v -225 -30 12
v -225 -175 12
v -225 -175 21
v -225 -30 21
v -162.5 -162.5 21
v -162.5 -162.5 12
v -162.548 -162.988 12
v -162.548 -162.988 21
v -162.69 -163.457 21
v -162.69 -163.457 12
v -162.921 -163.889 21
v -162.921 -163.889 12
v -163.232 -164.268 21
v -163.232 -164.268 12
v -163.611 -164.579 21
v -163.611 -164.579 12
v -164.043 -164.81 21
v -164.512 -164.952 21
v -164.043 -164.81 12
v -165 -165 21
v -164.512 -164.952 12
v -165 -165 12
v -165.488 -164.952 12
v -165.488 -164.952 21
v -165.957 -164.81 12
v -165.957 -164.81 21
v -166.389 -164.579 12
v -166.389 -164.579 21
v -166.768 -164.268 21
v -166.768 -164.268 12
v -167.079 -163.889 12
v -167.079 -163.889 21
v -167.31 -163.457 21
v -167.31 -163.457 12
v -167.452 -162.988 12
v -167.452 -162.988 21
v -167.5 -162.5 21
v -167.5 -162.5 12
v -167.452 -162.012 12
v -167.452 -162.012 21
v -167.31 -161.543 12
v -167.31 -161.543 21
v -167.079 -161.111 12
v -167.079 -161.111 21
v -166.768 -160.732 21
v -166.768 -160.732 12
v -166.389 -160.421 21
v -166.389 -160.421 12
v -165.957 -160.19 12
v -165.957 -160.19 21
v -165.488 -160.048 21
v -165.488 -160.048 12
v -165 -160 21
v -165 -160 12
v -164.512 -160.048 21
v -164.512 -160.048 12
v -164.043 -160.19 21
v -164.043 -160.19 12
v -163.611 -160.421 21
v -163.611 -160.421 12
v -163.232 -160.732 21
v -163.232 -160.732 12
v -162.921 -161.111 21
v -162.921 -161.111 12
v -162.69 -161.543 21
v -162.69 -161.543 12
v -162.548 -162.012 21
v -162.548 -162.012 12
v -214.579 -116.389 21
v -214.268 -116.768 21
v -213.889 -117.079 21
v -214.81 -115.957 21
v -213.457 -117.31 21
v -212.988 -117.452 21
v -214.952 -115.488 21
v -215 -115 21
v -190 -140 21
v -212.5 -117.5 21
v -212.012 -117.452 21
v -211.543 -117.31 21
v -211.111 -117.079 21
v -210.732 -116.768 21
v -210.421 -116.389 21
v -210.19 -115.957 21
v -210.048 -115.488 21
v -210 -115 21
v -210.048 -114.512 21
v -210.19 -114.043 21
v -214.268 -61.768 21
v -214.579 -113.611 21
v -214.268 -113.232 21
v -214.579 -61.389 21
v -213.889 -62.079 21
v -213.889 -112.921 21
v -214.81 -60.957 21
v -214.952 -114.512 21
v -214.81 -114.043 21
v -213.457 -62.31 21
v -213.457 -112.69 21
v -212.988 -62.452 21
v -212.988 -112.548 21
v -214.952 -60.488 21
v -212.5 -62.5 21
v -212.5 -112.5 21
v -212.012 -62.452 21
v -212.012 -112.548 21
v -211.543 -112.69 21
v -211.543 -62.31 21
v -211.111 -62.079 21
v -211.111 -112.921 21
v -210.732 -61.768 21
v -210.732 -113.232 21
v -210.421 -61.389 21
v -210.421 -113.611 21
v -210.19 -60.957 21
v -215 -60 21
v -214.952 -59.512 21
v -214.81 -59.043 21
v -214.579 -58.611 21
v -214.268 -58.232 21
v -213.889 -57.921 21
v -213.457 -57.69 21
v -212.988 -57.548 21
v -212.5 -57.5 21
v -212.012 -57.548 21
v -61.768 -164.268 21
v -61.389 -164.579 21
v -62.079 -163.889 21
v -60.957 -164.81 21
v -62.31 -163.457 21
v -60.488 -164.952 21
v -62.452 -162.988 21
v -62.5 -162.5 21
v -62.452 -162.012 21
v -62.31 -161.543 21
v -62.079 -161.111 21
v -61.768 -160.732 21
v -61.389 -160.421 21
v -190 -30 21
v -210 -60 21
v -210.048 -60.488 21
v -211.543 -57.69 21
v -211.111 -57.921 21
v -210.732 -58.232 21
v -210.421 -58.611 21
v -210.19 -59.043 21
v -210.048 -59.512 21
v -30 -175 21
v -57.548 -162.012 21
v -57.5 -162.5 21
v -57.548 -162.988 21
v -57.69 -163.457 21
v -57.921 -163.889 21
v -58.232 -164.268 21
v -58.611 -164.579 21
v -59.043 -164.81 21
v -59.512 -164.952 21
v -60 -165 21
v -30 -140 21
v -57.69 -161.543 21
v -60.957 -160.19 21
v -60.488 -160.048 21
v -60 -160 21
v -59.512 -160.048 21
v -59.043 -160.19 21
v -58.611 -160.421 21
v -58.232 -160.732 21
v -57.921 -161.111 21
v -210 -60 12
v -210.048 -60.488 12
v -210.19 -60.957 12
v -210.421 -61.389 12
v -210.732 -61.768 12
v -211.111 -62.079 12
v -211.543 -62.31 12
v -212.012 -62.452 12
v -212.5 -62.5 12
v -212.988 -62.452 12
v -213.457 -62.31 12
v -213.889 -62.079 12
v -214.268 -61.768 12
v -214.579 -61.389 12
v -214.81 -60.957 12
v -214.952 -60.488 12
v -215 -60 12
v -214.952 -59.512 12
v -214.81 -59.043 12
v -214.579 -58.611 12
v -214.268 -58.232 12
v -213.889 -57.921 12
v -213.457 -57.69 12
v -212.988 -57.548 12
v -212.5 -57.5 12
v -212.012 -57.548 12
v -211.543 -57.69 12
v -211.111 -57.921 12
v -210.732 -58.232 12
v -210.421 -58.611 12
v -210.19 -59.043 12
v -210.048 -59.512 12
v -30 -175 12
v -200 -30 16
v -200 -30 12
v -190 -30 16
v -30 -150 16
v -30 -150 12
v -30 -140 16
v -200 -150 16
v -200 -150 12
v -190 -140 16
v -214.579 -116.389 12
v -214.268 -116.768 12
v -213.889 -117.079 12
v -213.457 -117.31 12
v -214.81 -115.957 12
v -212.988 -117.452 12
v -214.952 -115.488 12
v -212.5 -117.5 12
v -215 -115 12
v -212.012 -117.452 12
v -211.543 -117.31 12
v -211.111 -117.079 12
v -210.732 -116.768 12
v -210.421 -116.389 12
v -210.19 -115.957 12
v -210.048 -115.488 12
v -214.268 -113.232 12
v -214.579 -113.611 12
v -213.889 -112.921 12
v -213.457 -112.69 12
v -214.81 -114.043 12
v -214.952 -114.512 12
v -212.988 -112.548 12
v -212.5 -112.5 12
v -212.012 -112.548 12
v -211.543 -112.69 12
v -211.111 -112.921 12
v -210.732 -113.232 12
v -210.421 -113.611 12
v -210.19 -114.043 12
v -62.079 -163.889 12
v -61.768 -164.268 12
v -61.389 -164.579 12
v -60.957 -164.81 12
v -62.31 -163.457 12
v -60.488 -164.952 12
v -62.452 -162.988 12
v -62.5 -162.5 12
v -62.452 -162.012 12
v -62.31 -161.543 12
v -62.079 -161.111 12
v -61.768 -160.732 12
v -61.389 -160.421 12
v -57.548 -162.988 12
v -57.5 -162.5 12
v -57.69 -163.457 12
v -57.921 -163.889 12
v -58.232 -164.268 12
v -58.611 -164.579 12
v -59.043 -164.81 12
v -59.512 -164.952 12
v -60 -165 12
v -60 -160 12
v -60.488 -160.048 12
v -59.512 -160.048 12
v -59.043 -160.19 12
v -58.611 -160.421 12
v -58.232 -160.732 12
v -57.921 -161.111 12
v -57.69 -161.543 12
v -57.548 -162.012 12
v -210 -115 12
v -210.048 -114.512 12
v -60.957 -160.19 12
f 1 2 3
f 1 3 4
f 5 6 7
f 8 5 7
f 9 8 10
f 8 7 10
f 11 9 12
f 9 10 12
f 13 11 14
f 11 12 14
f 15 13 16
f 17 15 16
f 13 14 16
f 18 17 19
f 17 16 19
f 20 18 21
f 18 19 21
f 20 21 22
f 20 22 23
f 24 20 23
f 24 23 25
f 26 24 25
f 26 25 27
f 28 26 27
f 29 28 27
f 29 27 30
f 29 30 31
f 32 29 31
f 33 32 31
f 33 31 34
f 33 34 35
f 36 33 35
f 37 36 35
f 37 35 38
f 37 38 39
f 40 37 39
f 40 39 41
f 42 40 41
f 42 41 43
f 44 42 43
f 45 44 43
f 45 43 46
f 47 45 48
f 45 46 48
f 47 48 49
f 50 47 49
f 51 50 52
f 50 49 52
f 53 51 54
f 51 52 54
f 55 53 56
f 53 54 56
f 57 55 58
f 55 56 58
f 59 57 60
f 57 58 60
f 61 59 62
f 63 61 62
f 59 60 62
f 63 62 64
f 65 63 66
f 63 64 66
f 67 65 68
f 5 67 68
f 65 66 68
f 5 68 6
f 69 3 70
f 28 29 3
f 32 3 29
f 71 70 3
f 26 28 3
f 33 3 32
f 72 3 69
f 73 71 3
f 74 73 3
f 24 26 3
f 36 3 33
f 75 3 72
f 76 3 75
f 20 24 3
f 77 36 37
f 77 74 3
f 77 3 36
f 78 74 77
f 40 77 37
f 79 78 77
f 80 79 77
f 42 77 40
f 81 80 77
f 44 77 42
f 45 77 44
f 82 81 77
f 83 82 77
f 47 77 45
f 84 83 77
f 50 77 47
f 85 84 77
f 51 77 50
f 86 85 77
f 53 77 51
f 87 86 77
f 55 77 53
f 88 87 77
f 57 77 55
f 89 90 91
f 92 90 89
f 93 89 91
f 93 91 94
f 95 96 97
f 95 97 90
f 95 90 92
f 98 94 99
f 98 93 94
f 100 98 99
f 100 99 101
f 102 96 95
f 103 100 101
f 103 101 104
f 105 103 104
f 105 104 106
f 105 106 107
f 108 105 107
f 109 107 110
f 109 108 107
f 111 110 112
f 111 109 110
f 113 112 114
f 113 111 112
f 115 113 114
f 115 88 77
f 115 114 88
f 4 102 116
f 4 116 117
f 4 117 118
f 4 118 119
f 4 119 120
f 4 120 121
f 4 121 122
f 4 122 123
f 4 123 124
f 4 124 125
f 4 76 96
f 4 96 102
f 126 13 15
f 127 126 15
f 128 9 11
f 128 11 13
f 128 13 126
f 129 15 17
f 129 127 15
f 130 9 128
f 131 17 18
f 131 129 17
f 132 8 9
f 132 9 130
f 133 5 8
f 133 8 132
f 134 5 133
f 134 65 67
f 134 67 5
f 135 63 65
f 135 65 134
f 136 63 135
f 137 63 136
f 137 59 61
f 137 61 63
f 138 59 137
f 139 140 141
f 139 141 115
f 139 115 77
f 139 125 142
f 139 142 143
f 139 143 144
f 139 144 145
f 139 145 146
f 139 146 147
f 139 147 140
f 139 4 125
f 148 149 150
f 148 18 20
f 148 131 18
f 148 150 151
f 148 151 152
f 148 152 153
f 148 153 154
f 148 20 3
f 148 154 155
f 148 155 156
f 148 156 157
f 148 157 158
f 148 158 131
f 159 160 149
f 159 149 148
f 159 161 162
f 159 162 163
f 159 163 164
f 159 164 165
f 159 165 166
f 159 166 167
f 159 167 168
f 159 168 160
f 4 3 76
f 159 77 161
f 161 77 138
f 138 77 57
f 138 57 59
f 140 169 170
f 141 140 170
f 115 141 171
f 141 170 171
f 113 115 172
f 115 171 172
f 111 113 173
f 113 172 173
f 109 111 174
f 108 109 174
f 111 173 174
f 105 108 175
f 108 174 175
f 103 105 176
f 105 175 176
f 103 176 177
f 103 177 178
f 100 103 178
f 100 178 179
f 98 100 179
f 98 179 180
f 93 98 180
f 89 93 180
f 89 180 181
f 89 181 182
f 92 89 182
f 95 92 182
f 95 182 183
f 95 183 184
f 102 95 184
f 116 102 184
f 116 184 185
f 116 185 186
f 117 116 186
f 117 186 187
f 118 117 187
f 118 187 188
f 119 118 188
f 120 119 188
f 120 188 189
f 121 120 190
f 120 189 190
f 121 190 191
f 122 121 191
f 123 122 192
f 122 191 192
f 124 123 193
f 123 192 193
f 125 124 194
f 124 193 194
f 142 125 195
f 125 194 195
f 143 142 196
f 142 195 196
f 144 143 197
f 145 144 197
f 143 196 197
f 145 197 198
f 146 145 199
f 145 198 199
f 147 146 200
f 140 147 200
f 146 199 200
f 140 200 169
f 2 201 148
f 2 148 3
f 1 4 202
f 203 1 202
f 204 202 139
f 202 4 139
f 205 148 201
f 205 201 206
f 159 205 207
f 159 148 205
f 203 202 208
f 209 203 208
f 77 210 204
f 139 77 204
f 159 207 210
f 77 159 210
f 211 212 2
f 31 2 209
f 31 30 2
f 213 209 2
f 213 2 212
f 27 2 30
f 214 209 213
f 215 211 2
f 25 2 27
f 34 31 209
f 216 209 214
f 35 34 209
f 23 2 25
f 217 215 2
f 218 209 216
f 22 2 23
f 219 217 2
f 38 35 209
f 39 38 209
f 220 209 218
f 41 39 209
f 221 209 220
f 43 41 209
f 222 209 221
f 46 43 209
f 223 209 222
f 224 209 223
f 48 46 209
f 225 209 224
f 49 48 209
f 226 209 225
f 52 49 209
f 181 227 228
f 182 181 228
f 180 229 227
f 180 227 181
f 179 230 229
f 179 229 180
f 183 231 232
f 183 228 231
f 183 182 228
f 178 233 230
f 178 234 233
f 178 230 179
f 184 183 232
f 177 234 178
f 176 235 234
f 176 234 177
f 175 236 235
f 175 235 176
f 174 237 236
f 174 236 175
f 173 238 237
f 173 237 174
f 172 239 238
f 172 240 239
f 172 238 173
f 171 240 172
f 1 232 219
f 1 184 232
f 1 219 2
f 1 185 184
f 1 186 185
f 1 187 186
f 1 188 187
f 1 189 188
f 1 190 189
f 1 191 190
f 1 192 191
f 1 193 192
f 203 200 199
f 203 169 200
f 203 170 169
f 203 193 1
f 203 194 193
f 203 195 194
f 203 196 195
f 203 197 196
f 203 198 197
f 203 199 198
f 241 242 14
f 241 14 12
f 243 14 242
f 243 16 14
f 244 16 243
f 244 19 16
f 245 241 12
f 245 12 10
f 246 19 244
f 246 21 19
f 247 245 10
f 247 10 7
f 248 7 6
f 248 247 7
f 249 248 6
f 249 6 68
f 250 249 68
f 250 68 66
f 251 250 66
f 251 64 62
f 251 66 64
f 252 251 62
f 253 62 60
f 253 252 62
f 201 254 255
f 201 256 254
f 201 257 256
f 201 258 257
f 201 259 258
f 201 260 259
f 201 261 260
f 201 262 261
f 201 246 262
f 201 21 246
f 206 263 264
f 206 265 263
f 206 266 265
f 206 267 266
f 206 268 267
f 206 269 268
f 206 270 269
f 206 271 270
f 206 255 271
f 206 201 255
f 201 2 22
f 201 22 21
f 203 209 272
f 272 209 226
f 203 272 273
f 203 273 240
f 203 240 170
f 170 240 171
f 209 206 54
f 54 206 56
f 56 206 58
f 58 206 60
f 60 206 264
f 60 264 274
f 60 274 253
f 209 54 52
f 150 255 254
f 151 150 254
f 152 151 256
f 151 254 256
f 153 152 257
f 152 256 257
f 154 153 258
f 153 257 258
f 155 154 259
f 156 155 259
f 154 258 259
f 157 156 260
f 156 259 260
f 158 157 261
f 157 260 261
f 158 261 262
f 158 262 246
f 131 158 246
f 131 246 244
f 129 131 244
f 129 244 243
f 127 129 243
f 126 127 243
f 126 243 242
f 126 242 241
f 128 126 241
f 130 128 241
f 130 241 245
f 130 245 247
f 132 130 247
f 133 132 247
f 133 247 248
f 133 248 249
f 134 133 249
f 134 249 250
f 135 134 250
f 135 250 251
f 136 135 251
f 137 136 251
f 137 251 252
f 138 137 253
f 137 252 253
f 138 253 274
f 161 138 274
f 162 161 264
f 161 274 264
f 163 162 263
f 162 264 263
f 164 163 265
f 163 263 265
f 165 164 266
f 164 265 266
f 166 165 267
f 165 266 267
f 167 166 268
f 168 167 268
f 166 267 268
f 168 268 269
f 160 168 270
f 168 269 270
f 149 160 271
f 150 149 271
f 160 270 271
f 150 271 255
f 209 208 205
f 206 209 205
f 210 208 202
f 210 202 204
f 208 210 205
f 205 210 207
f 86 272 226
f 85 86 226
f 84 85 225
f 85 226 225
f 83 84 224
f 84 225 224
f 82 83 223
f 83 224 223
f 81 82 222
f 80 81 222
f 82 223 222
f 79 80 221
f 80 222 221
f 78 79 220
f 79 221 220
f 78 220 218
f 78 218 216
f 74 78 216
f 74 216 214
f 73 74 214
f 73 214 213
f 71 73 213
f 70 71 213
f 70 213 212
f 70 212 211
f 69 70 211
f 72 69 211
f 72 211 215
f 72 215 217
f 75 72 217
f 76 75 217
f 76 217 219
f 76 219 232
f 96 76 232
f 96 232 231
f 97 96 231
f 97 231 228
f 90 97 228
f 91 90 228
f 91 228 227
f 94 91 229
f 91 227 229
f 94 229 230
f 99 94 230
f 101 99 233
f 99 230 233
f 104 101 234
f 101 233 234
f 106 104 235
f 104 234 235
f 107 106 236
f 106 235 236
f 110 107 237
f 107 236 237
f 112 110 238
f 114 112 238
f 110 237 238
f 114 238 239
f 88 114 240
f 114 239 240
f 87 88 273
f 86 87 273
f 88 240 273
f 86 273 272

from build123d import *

# Parameters (mm, degrees)
F1_DEPTH  = 12
F2_W      = 200
F2_H      = 20
F3_DEPTH  = 5
F4_W      = 155
F4_H      = 20
F5_DEPTH  = 5
F6_R      = 2.5
F7_DEPTH  = 25
F9_DEPTH  = 5
F10_W     = 195
F10_H     = 30
F10_W_2   = 30
F10_H_2   = 145
F11_DEPTH = 25
F12_W     = 145
F12_H     = 16
F13_DEPTH = 195.0010001


with BuildPart() as f1:
    # F0 (on Top) → F1 (new body)
    with BuildSketch(Plane.XY):
        with BuildLine():
            add(Edge.make_bspline(
                [(-176, 0), (-176, -130), (0, -130)],
                knots=[3.1415926536, 3.1415926536, 3.1415926536, 4.7123889804, 4.7123889804, 4.7123889804], degree=2, weights=[1, 0.7071067812, 1]))
            Line((-176, 0), (-176, -130))
            Line((-176, -130), (0, -130))
        make_face()
        Polygon((-176, -130), (-176, 0), (-200, 0), (-200, -150), (0, -150), (0, -130), align=None)
    extrude(amount=F1_DEPTH)

    # F2 (on face) → F3 (join)
    with BuildSketch(Plane.XZ.offset(150)):
        with Locations((-100, 6)):
            Rectangle(F2_W, F2_H)
    extrude(amount=F3_DEPTH)

    # F4 (on face) → F5 (join)
    with BuildSketch(Plane(origin=(-200, 0, 0), x_dir=(0, -1, 0), z_dir=(-1, 0, 0))):
        with Locations((77.5, 6)):
            Rectangle(F4_W, F4_H)
    extrude(amount=F5_DEPTH)

    # F6 (on face) → F7 (join)
    with BuildSketch(Plane(origin=(0, 0, -4), x_dir=(1, 0, 0), z_dir=(0, 0, -1))):
        Polygon((0, 155), (0, 175), (-225, 175), (-225, 0), (-205, 0), (-205, 155), align=None)
        with Locations((-212.5, 60)):
            Circle(F6_R, mode=Mode.SUBTRACT)
        with Locations((-212.5, 115)):
            Circle(F6_R, mode=Mode.SUBTRACT)
        with Locations((-165, 162.5)):
            Circle(F6_R, mode=Mode.SUBTRACT)
        with Locations((-60, 162.5)):
            Circle(F6_R, mode=Mode.SUBTRACT)
    extrude(amount=-F7_DEPTH)

    # F8 (on face) → F9 (join)
    with BuildSketch(Plane.XY.offset(16)):
        Polygon((-190, 0), (-205, 0), (-205, -155), (0, -155), (0, -140), (-190, -140), align=None)
    extrude(amount=F9_DEPTH)

    # F10 (on Top) → F11 (cut, symmetric)
    with BuildSketch(Plane.XY):
        with Locations((-127.5, -15)):
            Rectangle(F10_W, F10_H)
        with Locations((-15, -15)):
            Rectangle(F10_W_2, F10_H)
        with Locations((-15, -102.5)):
            Rectangle(F10_W_2, F10_H_2)
    extrude(amount=F11_DEPTH, both=True, mode=Mode.SUBTRACT)

    # F12 (on face) → F13 (cut, through all)
    with BuildSketch(Plane.YZ.offset(-30)):
        with Locations((-102.5, 4)):
            Rectangle(F12_W, F12_H)
    extrude(amount=-F13_DEPTH, mode=Mode.SUBTRACT)


solid = f1.part
